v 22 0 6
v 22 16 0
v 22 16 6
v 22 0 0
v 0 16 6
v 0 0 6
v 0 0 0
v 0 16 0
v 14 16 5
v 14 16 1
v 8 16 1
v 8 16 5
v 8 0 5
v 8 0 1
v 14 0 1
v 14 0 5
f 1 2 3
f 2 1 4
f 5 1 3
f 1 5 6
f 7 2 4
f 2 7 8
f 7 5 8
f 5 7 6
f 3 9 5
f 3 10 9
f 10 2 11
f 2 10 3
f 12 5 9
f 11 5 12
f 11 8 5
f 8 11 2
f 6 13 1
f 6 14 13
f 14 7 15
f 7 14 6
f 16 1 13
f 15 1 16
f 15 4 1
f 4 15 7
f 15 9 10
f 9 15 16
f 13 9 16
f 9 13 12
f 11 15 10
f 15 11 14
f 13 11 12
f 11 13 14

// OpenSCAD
// base

difference() {
  cube([22,16,6]);

  translate([0,0,1])  
  translate([22-6,0,0]*0.5)
    cube([6,16,4]);
}
